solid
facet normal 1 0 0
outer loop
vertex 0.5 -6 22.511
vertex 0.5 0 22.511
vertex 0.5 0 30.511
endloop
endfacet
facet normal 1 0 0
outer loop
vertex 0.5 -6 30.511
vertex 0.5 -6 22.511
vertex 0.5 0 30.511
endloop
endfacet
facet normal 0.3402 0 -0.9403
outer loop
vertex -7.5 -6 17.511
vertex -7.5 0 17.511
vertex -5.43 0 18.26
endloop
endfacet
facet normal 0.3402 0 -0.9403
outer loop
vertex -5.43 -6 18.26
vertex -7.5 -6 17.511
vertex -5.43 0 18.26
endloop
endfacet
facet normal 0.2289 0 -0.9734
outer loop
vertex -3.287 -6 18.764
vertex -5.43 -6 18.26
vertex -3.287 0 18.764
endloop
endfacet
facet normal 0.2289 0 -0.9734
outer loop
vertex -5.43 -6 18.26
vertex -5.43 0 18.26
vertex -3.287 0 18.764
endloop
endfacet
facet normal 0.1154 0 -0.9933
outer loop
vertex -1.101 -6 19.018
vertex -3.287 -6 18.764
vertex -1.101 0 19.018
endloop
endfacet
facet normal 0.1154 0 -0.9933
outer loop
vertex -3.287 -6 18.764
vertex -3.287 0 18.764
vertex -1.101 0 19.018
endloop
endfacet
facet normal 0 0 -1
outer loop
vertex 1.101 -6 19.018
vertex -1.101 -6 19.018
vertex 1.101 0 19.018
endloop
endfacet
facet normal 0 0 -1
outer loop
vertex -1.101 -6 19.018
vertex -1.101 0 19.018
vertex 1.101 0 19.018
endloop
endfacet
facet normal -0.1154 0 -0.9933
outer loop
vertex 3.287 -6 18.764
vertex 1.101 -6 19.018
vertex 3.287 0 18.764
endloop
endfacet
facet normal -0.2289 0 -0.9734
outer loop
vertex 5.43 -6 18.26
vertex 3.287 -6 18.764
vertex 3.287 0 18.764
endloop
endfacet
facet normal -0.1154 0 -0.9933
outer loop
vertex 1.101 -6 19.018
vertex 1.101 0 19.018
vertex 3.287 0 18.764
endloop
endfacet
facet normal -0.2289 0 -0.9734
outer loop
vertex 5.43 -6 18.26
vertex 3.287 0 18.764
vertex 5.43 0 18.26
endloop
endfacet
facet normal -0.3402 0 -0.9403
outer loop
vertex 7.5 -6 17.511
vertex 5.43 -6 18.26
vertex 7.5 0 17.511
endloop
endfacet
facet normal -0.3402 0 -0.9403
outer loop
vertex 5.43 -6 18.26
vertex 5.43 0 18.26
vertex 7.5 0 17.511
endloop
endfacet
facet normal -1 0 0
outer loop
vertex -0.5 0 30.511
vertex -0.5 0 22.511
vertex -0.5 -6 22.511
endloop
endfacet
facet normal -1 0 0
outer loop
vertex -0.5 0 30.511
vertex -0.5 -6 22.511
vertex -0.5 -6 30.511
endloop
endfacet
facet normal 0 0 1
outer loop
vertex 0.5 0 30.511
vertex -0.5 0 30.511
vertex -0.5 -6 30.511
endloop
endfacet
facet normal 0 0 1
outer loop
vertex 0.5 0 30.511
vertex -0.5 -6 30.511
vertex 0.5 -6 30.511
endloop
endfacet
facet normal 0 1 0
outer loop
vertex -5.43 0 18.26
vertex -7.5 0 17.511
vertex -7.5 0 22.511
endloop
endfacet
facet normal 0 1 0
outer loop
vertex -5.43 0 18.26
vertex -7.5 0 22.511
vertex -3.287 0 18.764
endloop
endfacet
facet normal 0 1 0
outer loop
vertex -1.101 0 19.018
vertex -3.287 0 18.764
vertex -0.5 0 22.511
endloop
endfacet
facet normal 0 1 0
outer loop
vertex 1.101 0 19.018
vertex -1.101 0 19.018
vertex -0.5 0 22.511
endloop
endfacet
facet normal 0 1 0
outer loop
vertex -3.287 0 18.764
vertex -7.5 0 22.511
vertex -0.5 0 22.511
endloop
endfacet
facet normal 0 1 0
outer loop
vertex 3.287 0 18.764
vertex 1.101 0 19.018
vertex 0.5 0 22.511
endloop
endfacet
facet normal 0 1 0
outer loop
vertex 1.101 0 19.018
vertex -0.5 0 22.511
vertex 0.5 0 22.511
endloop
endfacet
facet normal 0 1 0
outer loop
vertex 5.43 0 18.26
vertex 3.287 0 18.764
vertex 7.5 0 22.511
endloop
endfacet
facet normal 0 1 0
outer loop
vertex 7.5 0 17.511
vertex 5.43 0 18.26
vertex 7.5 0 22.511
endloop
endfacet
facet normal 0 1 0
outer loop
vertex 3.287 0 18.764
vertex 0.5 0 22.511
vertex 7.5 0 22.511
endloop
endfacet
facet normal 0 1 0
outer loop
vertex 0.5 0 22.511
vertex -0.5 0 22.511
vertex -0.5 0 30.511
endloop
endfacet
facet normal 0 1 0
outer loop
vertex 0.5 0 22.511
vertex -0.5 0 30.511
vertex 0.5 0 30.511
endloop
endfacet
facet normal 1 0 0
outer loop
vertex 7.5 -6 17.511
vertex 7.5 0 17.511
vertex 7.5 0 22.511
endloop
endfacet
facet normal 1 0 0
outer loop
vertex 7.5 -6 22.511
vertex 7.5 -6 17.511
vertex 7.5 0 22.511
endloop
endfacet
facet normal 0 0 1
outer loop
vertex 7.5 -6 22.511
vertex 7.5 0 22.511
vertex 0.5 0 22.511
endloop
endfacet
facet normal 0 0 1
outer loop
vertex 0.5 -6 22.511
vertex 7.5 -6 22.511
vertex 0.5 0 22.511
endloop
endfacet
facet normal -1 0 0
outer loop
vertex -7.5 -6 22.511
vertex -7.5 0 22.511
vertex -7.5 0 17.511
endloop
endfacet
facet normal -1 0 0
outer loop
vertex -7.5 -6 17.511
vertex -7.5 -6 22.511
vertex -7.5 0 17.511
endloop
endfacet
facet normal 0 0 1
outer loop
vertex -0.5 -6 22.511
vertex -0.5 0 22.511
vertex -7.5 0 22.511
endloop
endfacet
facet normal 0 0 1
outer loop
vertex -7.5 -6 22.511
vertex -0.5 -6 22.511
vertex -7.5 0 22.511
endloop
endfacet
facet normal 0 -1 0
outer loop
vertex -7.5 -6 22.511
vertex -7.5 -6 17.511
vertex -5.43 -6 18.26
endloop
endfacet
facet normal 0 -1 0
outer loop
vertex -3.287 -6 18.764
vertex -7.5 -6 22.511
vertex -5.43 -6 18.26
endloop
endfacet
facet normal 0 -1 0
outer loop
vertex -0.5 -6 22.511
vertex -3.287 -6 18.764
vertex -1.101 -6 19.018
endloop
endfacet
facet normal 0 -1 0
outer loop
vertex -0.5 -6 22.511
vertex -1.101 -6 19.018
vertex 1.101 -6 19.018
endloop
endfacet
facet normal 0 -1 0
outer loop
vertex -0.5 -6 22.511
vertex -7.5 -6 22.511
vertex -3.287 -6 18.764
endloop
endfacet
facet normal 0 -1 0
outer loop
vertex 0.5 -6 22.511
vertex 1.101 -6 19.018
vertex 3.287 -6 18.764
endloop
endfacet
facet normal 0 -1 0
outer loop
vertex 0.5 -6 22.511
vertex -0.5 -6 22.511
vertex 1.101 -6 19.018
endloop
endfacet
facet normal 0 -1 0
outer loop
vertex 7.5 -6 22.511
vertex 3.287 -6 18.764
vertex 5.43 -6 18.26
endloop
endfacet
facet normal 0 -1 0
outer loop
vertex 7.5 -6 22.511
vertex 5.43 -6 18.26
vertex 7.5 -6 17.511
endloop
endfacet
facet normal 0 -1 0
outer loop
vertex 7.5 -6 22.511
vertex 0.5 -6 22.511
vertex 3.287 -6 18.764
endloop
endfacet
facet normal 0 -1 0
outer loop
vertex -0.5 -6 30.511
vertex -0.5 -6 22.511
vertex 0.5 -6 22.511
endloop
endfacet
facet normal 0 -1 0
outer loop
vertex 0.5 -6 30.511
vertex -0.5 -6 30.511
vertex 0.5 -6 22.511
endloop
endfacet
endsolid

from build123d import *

# Parameters (mm, degrees)
F0_W     = 1
F0_H     = 8
F1_DEPTH = 6


with BuildPart() as f1:
    # F0 (on Front) → F1 (new body)
    with BuildSketch(Plane.XZ):
        with BuildLine():
            ThreePointArc((-7.5, 17.511496), (0, 19.05), (7.5, 17.511496))
            Line((7.5, 17.511496), (7.5, 22.511496))
            Line((7.5, 22.511496), (0.5, 22.511496))
            Line((0.5, 22.511496), (-0.5, 22.511496))
            Line((-0.5, 22.511496), (-7.5, 22.511496))
            Line((-7.5, 22.511496), (-7.5, 17.511496))
        make_face()
        with Locations((0, 26.511496)):
            Rectangle(F0_W, F0_H)
    extrude(amount=F1_DEPTH)


solid = f1.part
